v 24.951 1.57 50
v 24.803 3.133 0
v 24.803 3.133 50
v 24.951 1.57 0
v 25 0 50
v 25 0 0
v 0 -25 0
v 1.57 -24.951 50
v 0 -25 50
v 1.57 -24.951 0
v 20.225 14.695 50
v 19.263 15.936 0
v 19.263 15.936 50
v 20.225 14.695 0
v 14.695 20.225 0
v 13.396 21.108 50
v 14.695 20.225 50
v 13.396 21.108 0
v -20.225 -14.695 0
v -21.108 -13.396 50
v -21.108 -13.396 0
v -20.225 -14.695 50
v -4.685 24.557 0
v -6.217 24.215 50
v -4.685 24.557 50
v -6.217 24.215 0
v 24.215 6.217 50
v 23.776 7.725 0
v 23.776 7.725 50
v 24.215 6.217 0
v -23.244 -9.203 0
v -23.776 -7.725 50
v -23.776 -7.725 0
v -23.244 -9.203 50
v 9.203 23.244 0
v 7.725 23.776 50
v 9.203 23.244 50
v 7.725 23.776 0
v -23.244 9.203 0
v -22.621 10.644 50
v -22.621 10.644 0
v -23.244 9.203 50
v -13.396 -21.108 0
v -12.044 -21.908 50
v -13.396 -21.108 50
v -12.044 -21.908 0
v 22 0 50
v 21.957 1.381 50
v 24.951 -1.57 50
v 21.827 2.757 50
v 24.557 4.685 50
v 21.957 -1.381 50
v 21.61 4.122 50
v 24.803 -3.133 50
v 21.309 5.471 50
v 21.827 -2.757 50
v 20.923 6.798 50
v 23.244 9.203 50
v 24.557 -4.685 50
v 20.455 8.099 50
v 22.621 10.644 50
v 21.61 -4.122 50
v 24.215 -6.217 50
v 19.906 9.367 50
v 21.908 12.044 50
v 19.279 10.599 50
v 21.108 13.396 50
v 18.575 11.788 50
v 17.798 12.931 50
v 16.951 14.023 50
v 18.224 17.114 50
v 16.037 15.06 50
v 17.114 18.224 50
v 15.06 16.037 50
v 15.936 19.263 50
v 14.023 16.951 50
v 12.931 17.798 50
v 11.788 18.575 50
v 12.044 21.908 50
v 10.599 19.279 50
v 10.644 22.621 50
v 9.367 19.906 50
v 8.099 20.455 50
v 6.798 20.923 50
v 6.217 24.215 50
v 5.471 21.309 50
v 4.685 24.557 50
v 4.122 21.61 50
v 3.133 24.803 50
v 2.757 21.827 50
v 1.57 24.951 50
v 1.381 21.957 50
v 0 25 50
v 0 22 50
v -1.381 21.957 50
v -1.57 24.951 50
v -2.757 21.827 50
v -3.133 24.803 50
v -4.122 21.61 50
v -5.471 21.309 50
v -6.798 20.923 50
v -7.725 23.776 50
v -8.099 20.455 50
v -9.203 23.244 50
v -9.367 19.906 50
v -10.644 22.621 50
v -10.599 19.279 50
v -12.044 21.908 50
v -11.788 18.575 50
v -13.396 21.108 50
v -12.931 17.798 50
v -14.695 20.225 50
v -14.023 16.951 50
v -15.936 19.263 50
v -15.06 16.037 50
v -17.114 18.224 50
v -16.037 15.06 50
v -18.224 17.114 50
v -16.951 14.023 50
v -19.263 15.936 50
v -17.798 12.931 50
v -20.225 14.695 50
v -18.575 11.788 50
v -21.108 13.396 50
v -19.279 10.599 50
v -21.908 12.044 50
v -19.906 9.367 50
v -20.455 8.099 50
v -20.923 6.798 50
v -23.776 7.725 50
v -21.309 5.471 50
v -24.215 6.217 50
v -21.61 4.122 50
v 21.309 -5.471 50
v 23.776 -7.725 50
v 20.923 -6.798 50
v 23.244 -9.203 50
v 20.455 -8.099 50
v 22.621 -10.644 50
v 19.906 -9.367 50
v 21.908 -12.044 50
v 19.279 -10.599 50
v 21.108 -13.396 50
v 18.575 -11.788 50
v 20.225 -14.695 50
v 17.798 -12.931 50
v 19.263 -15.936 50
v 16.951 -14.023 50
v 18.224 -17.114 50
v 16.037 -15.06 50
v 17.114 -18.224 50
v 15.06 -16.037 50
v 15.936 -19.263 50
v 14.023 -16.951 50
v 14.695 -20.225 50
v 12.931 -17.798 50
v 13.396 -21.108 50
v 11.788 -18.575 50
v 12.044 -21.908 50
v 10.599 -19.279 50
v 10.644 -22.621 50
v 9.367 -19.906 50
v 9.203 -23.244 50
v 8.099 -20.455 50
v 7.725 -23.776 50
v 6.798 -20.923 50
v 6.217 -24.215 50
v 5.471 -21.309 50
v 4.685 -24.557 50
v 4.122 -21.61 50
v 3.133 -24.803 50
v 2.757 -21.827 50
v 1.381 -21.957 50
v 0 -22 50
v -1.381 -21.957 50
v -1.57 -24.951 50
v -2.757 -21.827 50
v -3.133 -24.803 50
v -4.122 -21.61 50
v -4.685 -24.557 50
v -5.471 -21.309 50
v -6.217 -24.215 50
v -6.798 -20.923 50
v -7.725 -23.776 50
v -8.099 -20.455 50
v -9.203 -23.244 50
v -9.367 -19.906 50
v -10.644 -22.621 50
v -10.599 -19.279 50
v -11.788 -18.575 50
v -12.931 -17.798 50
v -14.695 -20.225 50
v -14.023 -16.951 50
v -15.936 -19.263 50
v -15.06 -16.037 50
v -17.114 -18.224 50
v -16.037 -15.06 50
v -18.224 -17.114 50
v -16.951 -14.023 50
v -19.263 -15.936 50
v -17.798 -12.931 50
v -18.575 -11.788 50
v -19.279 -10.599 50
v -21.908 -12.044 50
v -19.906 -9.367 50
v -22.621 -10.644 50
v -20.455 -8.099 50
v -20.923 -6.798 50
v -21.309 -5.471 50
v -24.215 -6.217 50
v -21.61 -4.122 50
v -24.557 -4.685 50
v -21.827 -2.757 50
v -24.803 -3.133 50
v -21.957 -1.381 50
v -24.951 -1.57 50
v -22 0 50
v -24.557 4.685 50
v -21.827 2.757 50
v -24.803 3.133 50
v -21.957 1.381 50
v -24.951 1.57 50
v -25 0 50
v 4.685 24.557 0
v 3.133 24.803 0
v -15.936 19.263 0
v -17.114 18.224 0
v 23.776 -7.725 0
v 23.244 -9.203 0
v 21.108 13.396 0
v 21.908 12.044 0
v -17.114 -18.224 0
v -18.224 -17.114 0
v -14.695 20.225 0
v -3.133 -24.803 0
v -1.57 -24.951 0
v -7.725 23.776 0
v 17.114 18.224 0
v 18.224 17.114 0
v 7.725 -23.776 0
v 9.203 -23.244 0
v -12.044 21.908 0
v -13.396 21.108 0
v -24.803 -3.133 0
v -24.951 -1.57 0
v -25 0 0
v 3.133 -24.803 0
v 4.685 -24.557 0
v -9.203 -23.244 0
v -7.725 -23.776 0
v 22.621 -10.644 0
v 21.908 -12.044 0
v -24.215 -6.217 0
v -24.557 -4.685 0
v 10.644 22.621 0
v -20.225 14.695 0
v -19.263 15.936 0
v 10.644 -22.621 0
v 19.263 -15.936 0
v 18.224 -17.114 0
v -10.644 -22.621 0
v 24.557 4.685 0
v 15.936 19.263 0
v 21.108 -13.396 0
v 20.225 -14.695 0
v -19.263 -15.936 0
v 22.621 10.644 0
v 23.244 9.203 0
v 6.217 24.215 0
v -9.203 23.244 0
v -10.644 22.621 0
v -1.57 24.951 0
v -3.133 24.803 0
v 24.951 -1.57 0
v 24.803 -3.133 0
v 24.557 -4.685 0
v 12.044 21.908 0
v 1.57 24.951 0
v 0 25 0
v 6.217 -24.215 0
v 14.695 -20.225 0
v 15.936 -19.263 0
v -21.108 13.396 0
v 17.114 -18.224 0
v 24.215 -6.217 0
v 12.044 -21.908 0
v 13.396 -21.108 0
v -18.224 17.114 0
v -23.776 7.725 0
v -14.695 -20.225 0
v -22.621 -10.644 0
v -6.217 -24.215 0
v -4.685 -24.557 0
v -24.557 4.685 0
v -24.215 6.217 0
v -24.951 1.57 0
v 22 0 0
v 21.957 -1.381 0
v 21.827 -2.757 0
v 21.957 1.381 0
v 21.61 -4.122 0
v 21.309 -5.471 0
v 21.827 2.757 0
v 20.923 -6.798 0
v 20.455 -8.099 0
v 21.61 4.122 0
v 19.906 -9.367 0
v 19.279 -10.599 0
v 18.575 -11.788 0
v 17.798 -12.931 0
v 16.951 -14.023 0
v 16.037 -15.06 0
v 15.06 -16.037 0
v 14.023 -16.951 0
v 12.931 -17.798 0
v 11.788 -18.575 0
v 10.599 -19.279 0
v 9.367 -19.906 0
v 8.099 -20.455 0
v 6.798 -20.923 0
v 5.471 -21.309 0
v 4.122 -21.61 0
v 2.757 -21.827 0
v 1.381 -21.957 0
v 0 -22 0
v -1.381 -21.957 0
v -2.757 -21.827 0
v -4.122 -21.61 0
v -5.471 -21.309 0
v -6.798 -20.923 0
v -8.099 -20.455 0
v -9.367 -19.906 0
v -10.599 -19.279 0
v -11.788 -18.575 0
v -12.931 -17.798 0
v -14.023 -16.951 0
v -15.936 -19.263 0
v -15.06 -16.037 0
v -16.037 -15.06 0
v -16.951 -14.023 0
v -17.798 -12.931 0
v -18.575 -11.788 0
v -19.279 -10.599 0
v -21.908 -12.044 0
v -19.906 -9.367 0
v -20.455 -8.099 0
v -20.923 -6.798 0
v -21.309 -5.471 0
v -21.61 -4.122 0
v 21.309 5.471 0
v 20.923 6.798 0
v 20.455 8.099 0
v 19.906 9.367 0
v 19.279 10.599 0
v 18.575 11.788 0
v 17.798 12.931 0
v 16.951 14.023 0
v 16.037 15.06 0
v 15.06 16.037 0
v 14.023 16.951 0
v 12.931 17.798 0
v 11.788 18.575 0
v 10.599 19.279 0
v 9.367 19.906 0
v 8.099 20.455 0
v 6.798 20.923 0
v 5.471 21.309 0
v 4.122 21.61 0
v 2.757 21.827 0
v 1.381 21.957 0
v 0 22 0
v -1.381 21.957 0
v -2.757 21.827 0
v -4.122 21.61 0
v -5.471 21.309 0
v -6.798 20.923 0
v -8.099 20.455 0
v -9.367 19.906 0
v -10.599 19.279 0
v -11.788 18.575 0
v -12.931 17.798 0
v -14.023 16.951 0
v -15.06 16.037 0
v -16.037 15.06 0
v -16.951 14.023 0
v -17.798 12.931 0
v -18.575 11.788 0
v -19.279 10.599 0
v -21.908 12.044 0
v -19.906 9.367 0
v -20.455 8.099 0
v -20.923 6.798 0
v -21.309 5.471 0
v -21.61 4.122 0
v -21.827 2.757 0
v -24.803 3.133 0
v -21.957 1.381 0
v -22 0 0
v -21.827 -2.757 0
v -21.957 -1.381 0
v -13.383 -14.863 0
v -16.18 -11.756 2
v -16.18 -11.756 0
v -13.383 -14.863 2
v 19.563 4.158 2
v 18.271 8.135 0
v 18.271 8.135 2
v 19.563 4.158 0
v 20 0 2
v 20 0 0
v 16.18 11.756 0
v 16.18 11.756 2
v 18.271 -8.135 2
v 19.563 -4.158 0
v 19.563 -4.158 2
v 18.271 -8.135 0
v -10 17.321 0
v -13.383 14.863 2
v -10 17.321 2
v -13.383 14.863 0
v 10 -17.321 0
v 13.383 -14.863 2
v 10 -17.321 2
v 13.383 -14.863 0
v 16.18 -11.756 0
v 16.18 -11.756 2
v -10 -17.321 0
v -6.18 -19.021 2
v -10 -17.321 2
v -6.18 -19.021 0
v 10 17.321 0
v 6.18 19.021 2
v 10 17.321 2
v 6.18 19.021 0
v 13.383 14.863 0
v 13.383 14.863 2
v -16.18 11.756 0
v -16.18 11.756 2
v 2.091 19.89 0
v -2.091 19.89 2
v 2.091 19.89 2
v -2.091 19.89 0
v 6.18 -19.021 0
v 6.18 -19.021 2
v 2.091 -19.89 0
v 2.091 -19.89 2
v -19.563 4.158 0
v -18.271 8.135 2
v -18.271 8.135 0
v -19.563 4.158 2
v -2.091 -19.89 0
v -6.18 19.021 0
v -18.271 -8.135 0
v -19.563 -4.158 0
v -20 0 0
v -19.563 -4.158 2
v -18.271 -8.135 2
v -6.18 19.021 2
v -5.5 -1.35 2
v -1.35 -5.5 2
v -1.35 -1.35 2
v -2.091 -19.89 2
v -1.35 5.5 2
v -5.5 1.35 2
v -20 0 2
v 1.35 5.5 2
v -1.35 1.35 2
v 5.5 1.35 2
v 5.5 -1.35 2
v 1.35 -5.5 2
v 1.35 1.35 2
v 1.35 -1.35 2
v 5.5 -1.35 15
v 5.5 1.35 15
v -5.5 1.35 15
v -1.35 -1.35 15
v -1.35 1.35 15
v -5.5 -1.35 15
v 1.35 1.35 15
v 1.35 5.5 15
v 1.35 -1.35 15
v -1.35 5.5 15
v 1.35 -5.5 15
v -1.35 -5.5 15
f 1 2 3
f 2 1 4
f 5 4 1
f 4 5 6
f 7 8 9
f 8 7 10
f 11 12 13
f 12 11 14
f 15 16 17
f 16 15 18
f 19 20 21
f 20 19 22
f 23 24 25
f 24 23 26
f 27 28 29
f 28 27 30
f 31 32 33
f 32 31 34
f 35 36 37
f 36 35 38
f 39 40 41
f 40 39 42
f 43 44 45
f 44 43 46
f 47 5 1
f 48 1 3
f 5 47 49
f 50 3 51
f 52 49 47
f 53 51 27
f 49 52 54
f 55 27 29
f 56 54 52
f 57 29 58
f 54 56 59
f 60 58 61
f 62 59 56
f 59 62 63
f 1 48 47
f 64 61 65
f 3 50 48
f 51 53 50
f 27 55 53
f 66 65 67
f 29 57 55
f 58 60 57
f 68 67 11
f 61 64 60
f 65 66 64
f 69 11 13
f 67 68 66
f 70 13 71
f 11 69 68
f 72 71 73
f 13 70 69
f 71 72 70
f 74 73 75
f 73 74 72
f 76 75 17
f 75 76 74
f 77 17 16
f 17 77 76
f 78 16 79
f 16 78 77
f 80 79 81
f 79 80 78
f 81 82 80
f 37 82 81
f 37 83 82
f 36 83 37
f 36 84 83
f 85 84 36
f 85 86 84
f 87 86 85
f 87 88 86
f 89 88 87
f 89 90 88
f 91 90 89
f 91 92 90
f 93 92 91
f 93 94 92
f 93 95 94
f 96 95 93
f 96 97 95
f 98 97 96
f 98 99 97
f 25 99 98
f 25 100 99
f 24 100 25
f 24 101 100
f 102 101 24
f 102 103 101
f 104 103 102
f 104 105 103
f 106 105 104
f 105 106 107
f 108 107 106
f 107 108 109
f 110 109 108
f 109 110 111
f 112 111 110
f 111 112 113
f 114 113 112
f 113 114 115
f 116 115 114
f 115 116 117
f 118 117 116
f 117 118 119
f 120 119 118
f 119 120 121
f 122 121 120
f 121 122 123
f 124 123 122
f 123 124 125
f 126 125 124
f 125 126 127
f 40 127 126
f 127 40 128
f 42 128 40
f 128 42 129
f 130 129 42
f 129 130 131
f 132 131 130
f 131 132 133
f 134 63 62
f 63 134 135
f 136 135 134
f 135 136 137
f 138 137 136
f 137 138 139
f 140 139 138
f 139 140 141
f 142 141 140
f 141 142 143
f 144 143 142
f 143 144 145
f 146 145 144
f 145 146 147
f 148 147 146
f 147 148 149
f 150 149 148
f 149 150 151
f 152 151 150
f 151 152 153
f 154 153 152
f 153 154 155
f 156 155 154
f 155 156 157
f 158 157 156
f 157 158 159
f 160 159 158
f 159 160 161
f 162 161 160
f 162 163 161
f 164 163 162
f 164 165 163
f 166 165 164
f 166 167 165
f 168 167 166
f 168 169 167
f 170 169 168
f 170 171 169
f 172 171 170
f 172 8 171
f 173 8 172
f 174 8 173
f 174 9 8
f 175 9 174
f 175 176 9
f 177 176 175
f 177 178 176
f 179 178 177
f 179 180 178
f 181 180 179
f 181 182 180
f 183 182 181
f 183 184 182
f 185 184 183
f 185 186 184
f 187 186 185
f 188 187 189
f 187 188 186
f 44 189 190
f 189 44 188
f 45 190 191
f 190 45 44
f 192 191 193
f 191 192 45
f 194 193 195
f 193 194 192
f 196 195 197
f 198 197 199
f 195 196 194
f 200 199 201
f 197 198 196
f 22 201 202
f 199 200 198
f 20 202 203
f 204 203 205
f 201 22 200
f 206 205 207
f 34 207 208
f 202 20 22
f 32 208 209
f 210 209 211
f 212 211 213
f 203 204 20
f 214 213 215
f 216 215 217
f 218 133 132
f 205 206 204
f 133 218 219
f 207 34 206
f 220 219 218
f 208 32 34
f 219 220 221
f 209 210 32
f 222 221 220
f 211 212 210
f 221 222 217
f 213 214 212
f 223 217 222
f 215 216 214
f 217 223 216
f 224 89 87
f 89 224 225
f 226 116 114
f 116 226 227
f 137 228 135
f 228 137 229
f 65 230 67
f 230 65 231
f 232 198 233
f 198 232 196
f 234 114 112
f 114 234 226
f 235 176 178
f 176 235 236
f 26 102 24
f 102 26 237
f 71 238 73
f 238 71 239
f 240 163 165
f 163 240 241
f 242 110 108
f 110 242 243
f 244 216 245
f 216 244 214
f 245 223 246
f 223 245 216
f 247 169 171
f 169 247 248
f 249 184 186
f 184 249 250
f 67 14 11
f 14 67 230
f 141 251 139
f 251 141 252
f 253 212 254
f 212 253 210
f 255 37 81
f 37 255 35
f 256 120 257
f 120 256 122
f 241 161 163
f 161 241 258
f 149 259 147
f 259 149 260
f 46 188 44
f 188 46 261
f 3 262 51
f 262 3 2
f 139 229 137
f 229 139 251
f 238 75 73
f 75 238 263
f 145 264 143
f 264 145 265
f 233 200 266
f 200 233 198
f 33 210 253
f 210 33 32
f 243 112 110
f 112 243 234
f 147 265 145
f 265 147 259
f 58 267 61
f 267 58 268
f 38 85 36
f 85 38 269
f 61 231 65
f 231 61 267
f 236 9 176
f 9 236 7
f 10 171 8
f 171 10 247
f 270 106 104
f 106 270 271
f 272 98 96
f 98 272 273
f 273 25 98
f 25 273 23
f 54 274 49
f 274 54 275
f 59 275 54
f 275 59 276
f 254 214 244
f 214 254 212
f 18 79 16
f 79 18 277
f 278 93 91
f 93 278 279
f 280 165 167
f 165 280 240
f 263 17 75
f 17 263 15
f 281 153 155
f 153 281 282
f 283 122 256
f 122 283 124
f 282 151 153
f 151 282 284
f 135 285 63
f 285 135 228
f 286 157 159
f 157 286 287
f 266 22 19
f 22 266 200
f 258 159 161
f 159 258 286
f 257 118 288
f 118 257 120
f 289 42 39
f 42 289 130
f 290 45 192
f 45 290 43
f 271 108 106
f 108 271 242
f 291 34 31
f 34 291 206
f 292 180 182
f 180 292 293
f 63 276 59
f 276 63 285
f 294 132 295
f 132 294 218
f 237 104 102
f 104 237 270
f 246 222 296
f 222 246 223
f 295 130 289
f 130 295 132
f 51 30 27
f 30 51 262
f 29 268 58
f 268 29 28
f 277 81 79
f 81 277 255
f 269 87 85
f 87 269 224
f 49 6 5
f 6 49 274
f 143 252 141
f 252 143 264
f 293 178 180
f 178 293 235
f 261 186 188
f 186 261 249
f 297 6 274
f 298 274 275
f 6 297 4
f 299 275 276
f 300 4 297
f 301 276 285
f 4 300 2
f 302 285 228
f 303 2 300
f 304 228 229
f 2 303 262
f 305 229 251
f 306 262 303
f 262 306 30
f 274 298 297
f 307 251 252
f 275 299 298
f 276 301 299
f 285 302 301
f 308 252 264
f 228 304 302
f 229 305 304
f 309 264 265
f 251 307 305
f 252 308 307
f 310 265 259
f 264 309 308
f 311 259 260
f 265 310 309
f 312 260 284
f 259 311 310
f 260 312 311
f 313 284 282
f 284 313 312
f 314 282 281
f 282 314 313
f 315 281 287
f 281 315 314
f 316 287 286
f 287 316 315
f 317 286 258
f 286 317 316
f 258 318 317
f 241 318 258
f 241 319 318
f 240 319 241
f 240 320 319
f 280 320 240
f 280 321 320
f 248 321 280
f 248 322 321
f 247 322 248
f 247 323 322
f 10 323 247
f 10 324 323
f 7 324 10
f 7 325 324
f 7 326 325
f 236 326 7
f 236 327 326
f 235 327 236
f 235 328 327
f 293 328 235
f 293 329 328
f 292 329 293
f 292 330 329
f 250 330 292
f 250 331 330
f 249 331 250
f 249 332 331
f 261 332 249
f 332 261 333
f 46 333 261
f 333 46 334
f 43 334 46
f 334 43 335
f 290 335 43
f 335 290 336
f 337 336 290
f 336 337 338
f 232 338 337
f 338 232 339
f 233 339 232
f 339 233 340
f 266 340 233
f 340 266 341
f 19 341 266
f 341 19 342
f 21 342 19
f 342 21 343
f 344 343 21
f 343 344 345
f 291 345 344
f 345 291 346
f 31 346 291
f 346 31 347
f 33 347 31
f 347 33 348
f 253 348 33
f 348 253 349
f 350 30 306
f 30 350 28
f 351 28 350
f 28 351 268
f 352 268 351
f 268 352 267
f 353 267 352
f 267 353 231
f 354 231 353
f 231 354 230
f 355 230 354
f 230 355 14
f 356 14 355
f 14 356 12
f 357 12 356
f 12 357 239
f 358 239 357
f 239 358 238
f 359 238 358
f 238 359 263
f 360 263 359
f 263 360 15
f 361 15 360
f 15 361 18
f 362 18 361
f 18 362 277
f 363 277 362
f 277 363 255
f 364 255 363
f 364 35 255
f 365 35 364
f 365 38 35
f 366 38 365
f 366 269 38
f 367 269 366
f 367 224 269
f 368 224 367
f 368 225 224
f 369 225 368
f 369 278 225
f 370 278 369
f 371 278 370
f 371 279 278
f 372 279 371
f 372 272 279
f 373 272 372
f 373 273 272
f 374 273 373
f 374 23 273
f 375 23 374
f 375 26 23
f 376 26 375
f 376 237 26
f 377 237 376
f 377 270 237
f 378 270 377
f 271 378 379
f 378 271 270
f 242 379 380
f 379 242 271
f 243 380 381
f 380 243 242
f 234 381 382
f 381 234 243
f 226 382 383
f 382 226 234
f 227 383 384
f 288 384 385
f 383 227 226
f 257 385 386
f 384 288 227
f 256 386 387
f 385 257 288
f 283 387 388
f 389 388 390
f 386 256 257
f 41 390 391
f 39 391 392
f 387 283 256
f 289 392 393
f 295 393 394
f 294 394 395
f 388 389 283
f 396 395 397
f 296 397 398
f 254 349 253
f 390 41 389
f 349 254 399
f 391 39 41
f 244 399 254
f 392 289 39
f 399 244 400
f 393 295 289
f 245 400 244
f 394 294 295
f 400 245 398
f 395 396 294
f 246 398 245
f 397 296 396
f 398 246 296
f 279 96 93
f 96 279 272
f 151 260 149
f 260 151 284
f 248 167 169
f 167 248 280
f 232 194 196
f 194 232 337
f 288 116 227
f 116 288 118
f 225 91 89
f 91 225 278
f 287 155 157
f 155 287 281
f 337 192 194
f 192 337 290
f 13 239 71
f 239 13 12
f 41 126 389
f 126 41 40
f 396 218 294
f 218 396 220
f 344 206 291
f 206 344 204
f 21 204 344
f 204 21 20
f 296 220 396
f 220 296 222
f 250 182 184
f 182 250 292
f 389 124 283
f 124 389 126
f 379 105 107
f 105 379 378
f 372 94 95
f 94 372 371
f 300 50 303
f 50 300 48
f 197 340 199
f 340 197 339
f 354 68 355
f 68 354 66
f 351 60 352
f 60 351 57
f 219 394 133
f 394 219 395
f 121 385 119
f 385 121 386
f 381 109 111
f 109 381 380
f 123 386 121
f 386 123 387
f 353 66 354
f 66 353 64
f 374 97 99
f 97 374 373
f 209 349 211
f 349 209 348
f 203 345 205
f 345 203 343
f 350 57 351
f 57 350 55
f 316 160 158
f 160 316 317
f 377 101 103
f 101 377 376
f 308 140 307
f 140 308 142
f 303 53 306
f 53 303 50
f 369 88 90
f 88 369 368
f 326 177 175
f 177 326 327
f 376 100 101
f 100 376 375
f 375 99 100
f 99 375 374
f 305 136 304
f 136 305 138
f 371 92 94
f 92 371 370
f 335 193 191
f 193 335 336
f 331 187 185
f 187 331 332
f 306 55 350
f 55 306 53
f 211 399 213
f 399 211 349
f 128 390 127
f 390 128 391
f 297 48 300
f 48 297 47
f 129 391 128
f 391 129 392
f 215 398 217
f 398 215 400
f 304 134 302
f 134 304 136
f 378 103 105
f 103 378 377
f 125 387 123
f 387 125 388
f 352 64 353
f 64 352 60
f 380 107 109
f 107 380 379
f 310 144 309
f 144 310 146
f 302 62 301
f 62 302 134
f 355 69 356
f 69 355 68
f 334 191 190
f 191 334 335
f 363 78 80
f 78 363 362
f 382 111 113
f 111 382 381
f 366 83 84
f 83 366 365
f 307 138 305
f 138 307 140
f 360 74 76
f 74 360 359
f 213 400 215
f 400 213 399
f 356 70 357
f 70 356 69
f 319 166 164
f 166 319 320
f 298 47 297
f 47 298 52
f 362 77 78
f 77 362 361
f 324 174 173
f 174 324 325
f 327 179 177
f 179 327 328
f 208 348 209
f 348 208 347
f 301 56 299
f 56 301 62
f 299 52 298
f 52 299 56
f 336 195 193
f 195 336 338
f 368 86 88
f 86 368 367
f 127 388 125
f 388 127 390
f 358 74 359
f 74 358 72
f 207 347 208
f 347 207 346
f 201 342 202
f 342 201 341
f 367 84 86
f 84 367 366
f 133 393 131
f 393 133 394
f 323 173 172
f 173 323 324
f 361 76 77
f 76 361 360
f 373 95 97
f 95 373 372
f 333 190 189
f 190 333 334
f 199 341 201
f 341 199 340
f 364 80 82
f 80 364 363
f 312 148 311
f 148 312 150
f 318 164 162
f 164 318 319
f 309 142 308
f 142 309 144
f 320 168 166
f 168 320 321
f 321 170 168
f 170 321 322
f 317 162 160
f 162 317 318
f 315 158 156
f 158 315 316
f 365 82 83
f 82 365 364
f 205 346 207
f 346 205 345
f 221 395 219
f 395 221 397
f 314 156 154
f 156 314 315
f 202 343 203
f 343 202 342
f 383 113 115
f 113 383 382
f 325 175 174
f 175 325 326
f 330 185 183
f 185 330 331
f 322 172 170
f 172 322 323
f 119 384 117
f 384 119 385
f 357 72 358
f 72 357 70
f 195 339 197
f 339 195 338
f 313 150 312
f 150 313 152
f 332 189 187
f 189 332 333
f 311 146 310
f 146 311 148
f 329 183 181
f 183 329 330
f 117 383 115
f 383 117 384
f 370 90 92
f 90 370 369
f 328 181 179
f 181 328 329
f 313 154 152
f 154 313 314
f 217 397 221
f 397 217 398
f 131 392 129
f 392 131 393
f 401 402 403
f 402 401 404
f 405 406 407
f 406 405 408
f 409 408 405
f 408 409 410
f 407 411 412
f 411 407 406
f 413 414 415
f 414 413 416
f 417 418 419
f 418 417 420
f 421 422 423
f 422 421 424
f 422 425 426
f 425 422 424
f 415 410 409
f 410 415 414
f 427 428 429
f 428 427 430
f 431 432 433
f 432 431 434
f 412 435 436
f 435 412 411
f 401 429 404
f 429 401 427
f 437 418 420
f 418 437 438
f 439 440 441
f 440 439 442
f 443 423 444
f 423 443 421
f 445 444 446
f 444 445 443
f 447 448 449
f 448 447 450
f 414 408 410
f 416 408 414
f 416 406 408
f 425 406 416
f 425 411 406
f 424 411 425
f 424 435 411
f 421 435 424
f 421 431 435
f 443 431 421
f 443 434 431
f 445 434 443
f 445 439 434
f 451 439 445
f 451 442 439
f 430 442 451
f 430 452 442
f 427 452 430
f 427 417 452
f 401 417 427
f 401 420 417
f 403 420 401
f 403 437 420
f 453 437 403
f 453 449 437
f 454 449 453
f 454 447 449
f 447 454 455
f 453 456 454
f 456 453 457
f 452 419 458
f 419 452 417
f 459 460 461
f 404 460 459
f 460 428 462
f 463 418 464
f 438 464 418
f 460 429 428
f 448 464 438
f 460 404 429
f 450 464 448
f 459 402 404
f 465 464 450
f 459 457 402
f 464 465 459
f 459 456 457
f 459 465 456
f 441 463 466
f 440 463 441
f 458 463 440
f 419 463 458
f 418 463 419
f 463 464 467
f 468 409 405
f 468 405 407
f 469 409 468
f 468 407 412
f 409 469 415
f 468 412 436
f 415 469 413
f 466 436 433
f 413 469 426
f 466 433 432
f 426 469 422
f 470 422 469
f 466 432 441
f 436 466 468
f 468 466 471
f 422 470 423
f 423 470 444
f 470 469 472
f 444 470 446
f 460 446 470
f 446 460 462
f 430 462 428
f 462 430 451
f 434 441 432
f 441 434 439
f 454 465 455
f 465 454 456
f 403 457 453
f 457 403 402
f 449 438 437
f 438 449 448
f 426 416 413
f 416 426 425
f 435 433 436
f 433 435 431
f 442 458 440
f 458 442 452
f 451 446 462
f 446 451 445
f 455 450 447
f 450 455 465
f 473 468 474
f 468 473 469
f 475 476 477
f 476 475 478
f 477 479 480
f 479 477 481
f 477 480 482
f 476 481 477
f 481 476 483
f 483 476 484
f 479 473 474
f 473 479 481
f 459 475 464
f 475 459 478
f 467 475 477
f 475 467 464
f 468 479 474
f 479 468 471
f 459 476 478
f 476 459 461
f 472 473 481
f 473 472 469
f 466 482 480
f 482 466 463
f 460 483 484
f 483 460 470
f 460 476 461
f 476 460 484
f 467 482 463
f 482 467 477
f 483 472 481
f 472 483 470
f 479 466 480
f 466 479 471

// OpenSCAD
module tube_with_border(inner_diameter, border_thickness, height, $fn = 100) {
  difference() {
    cylinder(h = height, d = inner_diameter + 2 * border_thickness, $fn = $fn);
    cylinder(h = height + 0.1, d = inner_diameter, $fn = $fn);
  }
}

// Example usage:
tube_with_border(inner_diameter = 44, border_thickness = 3, height = 50, $fn = 100);


radius = 20;
height = 2;

translate([0, 0, 0 ]) cylinder(h = height, r = radius);


x_size = 11;
y_size = 2.7;
cross_height = 15;

translate([-x_size/2, -y_size/2, 0]) cube([x_size, y_size, cross_height]);

rotate([0, 0, 90]) translate([-x_size/2, -y_size/2, 0]) cube([x_size, y_size, cross_height]);
